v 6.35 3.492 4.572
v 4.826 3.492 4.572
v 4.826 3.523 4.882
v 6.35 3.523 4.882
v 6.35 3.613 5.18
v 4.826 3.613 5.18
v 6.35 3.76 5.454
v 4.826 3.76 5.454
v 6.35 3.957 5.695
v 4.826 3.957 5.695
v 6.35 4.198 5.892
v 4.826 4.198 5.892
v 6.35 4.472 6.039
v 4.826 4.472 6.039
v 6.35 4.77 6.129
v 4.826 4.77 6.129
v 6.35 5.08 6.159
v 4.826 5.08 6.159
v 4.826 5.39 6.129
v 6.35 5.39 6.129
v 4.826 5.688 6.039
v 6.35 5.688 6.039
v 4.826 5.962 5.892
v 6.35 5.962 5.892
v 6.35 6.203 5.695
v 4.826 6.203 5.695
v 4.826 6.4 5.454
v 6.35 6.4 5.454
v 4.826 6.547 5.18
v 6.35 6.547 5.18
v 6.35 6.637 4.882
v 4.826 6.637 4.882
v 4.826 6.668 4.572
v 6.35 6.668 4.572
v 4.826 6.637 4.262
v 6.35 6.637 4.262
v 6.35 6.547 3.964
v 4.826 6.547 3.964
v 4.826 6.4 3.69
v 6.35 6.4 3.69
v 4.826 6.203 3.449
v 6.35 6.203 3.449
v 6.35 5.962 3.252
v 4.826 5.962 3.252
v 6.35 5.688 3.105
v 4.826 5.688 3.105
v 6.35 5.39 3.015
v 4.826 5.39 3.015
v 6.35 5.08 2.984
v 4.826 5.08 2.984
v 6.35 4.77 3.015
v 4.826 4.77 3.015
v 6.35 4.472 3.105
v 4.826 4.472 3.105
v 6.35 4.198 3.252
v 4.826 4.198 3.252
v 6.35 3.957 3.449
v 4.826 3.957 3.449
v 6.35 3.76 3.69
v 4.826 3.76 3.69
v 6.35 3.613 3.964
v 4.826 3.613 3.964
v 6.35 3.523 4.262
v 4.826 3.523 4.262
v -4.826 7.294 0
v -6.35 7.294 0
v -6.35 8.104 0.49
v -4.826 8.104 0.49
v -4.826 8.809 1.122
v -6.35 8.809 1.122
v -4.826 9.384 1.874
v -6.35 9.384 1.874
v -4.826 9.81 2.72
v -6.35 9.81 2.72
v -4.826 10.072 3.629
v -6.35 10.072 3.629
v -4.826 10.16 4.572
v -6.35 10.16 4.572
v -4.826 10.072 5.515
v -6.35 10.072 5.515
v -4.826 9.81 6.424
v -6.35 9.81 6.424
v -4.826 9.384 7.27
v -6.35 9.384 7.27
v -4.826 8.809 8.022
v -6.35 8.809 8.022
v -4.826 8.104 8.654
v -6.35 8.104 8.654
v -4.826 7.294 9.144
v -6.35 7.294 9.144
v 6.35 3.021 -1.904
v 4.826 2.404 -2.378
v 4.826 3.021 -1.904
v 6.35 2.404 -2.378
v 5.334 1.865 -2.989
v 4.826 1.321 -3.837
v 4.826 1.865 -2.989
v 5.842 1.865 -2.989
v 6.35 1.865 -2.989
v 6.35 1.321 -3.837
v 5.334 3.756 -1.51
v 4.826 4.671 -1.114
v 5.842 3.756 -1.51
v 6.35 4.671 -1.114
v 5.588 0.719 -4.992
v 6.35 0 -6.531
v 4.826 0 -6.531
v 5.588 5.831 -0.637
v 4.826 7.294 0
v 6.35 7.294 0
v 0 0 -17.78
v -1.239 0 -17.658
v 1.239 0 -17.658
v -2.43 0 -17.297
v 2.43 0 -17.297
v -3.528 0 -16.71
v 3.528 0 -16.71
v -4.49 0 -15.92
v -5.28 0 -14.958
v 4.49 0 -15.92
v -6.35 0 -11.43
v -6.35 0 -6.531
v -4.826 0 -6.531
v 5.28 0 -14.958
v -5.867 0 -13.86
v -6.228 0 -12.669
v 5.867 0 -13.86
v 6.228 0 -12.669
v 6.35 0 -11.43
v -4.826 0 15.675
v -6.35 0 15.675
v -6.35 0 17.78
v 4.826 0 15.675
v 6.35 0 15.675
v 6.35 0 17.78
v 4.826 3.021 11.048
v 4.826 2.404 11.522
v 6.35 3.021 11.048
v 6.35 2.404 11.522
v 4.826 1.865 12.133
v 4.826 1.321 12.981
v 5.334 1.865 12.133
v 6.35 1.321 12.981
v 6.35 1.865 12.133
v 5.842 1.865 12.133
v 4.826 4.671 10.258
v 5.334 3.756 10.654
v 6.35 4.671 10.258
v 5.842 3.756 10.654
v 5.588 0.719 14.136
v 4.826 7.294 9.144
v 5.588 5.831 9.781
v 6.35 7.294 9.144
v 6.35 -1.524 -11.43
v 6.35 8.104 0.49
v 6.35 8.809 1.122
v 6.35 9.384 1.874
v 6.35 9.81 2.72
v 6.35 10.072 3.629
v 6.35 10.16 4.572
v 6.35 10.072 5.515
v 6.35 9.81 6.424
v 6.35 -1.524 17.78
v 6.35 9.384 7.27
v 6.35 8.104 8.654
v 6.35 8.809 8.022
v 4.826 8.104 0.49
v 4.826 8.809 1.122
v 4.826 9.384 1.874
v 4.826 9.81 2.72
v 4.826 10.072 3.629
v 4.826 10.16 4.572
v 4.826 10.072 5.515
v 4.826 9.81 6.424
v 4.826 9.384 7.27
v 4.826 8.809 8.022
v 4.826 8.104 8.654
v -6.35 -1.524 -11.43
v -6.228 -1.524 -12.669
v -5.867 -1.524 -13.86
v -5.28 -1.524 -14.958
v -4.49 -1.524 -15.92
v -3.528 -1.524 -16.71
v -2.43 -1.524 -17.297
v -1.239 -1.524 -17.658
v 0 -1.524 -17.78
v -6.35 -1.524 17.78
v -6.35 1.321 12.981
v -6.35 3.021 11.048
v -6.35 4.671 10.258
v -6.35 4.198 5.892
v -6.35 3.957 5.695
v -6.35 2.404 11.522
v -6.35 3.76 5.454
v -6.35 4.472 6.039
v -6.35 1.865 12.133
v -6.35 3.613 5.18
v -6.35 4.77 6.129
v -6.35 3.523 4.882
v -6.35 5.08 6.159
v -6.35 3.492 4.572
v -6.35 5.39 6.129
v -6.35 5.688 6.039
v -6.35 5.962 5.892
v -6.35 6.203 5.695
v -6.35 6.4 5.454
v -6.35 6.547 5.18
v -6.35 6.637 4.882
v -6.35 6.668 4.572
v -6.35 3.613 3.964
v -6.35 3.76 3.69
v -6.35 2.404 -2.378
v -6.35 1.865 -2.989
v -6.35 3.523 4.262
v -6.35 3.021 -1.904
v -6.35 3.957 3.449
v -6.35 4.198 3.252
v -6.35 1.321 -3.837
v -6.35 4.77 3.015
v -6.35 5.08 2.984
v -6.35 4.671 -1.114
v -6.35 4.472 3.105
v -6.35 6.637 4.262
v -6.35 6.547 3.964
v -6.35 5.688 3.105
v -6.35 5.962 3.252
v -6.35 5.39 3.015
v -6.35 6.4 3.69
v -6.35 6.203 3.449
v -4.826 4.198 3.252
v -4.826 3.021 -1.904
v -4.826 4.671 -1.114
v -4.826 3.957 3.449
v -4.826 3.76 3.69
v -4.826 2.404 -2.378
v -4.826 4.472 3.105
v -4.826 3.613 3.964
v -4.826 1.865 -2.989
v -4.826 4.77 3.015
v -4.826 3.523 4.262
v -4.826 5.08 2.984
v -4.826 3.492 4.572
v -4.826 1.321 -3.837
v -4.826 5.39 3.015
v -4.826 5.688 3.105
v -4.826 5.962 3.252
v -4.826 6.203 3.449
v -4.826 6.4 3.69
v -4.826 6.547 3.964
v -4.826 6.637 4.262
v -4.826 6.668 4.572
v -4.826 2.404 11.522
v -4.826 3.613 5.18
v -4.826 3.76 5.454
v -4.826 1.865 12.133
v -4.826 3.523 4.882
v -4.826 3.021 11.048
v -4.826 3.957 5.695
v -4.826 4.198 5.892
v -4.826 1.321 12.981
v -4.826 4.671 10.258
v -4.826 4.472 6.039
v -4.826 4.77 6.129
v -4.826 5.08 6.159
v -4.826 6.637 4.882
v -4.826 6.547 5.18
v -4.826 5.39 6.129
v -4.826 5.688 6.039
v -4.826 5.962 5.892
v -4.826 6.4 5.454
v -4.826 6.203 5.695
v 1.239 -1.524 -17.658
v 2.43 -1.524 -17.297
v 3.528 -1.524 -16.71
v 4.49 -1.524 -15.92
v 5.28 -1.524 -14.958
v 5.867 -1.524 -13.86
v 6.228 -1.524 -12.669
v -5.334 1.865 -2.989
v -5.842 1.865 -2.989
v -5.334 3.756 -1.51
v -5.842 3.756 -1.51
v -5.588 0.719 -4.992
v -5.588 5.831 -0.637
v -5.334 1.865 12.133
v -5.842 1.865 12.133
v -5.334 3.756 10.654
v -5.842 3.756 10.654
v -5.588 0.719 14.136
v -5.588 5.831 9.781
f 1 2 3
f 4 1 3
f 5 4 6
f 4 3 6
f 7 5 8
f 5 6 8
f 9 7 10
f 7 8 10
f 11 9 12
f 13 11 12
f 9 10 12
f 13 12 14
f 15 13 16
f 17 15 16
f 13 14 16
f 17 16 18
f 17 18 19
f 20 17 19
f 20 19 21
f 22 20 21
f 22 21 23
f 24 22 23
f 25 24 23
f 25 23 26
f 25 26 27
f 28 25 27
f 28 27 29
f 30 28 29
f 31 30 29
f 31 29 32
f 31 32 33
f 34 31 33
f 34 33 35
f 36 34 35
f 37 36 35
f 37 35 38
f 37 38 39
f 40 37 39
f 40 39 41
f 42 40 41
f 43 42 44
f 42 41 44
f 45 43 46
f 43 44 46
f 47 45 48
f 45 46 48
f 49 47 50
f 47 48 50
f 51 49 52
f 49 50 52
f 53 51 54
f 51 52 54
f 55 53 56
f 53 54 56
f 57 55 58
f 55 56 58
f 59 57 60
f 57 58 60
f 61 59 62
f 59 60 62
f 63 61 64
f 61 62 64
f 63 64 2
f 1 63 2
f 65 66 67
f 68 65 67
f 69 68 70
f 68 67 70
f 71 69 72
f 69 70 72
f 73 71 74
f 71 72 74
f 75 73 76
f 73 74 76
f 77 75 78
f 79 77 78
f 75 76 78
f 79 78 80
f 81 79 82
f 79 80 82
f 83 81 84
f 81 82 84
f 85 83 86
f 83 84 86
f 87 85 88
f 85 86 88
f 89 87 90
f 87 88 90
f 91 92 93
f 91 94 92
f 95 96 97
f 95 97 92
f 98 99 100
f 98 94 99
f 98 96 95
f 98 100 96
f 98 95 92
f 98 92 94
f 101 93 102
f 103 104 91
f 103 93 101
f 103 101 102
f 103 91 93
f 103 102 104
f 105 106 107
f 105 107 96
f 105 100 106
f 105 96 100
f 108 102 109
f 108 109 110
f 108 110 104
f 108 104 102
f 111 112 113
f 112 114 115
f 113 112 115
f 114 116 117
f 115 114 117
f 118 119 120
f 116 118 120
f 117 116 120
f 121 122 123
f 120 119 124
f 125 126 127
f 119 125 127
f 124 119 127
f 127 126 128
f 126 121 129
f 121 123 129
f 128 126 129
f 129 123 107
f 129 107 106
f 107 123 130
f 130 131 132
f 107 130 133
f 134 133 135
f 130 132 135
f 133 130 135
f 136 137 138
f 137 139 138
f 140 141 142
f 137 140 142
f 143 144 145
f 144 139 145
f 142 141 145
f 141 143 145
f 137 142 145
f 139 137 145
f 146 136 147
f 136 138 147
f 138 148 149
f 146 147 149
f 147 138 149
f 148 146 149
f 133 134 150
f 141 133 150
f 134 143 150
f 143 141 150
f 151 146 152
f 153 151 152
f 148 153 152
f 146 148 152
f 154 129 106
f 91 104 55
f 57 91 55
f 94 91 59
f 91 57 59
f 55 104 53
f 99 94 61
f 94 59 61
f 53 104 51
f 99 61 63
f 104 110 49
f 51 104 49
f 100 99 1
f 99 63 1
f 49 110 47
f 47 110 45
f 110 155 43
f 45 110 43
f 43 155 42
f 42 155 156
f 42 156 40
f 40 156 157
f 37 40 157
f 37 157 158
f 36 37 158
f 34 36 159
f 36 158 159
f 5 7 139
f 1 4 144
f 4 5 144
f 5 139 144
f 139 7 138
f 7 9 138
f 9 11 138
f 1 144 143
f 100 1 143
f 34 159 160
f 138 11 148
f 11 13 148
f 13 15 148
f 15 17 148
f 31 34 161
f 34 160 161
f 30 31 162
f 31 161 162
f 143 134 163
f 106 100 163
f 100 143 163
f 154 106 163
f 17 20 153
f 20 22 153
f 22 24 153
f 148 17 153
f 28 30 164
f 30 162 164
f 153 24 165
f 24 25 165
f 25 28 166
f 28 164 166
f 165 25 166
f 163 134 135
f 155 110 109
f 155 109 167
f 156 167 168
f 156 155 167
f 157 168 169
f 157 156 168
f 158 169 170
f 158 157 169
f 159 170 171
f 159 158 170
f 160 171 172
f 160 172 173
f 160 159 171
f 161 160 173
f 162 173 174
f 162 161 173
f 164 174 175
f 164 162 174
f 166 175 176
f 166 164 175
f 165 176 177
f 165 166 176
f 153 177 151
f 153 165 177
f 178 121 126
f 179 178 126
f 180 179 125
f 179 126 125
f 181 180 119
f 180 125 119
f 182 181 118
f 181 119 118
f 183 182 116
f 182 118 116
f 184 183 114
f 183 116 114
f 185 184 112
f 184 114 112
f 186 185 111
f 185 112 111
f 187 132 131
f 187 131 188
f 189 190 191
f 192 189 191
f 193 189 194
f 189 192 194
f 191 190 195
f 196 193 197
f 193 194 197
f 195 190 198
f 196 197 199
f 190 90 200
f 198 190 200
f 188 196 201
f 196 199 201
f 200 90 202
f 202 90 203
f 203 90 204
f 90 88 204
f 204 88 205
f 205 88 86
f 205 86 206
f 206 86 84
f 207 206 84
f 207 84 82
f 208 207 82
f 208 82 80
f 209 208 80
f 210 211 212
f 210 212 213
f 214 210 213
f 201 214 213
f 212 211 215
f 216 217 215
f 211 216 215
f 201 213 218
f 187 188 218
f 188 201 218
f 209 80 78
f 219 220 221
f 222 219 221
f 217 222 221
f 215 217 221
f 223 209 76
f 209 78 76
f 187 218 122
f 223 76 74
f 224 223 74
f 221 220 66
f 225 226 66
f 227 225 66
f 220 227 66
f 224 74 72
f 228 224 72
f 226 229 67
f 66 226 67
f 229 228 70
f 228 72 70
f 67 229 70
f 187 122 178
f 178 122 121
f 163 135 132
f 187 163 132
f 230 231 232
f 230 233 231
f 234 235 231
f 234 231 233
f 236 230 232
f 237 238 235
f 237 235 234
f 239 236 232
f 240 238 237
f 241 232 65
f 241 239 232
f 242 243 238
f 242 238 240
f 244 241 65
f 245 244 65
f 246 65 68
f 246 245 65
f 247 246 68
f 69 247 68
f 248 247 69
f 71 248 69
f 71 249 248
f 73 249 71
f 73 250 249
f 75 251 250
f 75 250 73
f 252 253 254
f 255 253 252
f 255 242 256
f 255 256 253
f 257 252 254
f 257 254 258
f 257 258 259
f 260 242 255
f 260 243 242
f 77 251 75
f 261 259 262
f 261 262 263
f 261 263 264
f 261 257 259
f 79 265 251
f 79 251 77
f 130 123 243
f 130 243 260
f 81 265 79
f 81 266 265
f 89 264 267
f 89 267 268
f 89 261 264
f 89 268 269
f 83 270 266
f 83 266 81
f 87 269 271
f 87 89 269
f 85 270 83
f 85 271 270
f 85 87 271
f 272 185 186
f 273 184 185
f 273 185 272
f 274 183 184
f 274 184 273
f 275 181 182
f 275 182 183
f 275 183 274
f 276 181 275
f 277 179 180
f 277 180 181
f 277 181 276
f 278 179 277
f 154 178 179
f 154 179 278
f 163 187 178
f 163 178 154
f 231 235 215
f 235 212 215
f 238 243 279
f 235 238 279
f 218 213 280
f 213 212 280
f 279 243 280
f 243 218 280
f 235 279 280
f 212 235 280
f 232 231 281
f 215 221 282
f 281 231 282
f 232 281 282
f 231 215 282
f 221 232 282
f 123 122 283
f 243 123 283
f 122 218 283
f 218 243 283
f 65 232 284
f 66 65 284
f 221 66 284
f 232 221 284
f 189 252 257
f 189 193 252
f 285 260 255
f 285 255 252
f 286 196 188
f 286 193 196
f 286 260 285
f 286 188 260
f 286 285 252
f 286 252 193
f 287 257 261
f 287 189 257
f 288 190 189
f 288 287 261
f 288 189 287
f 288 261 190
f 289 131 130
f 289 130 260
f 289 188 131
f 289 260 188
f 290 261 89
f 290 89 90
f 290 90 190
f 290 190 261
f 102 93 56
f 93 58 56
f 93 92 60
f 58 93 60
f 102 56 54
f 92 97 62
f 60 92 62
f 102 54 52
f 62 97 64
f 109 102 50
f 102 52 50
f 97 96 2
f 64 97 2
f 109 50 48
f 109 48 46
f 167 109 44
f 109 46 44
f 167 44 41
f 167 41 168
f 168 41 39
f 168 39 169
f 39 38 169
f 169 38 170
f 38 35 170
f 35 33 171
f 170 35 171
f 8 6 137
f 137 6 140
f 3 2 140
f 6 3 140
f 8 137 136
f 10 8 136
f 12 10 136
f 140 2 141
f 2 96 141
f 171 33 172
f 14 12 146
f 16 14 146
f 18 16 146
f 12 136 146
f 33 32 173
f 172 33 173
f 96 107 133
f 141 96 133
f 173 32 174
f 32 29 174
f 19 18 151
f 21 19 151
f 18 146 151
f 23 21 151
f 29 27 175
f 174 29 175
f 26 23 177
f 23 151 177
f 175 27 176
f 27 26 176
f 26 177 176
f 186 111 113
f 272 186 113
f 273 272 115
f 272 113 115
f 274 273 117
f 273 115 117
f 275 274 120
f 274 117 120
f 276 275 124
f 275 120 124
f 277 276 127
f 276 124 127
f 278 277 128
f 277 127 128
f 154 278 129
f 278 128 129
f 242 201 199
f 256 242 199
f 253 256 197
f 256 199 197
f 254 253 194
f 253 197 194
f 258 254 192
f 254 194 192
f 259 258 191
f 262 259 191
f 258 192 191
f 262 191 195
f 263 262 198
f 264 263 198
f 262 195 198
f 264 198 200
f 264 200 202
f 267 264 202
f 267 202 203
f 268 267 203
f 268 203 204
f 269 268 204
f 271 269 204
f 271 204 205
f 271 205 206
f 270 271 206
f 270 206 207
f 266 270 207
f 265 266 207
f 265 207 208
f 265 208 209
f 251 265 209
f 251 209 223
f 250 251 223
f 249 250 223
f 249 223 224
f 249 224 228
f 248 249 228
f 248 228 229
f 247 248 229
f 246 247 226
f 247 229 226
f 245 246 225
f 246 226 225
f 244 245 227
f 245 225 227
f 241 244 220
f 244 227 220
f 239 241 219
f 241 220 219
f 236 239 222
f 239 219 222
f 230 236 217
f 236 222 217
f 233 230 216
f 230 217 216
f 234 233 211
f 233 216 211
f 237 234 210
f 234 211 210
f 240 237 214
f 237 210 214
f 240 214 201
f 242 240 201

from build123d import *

# Parameters (mm, degrees)
F1_DEPTH = 1.524
F3_DEPTH = 1.524
F6_D     = 3.175


with BuildPart() as f1:
    # F0 (on Front) → F1 (new body)
    with BuildSketch(Plane.XZ):
        with BuildLine():
            Line((6.35, 17.78), (-6.35, 17.78))
            Line((-6.35, 17.78), (-6.35, -11.43))
            ThreePointArc((-6.35, -11.43), (-4.4901280605, -15.9201280605), (0, -17.78))
            ThreePointArc((0, -17.78), (4.4901280605, -15.9201280605), (6.35, -11.43))
            Line((6.35, -11.43), (6.35, 17.78))
        make_face()
    extrude(amount=F1_DEPTH)

    # F2 (on face) → F3 (join)
    with BuildSketch(Plane.YZ.offset(6.35)):
        with BuildLine():
            add(Edge.make_bspline(
                [(0, -6.5310765533), (2.3925540429, -1.2585692564), (2.3925540429, -2.2239157952), (7.2943206633, 0)],
                knots=[0, 0, 0, 0, 9.7909179796, 9.7909179796, 9.7909179796, 9.7909179796], degree=3))
            ThreePointArc((7.2943206633, 0), (10.16, 4.572), (7.2943206633, 9.144))
            add(Edge.make_bspline(
                [(0, 15.6750765533), (2.3925540429, 10.4025692564), (2.3925540429, 11.3679157952), (7.2943206633, 9.144)],
                knots=[0, 0, 0, 0, 9.7909179796, 9.7909179796, 9.7909179796, 9.7909179796], degree=3))
            Line((0, 15.6750765533), (0, -6.5310765533))
        make_face()
    extrude(amount=-F3_DEPTH)

    # F4: F1 across plane


with BuildPart() as f1_1:
    add(f1.part)
    add(f1.part.mirror(Plane.YZ))

    # F6 (through all)
    with Locations(Plane.YZ.offset(6.35)):
        with Locations((5.08, 4.572)):
            Hole(F6_D / 2)


solid = f1_1.part
